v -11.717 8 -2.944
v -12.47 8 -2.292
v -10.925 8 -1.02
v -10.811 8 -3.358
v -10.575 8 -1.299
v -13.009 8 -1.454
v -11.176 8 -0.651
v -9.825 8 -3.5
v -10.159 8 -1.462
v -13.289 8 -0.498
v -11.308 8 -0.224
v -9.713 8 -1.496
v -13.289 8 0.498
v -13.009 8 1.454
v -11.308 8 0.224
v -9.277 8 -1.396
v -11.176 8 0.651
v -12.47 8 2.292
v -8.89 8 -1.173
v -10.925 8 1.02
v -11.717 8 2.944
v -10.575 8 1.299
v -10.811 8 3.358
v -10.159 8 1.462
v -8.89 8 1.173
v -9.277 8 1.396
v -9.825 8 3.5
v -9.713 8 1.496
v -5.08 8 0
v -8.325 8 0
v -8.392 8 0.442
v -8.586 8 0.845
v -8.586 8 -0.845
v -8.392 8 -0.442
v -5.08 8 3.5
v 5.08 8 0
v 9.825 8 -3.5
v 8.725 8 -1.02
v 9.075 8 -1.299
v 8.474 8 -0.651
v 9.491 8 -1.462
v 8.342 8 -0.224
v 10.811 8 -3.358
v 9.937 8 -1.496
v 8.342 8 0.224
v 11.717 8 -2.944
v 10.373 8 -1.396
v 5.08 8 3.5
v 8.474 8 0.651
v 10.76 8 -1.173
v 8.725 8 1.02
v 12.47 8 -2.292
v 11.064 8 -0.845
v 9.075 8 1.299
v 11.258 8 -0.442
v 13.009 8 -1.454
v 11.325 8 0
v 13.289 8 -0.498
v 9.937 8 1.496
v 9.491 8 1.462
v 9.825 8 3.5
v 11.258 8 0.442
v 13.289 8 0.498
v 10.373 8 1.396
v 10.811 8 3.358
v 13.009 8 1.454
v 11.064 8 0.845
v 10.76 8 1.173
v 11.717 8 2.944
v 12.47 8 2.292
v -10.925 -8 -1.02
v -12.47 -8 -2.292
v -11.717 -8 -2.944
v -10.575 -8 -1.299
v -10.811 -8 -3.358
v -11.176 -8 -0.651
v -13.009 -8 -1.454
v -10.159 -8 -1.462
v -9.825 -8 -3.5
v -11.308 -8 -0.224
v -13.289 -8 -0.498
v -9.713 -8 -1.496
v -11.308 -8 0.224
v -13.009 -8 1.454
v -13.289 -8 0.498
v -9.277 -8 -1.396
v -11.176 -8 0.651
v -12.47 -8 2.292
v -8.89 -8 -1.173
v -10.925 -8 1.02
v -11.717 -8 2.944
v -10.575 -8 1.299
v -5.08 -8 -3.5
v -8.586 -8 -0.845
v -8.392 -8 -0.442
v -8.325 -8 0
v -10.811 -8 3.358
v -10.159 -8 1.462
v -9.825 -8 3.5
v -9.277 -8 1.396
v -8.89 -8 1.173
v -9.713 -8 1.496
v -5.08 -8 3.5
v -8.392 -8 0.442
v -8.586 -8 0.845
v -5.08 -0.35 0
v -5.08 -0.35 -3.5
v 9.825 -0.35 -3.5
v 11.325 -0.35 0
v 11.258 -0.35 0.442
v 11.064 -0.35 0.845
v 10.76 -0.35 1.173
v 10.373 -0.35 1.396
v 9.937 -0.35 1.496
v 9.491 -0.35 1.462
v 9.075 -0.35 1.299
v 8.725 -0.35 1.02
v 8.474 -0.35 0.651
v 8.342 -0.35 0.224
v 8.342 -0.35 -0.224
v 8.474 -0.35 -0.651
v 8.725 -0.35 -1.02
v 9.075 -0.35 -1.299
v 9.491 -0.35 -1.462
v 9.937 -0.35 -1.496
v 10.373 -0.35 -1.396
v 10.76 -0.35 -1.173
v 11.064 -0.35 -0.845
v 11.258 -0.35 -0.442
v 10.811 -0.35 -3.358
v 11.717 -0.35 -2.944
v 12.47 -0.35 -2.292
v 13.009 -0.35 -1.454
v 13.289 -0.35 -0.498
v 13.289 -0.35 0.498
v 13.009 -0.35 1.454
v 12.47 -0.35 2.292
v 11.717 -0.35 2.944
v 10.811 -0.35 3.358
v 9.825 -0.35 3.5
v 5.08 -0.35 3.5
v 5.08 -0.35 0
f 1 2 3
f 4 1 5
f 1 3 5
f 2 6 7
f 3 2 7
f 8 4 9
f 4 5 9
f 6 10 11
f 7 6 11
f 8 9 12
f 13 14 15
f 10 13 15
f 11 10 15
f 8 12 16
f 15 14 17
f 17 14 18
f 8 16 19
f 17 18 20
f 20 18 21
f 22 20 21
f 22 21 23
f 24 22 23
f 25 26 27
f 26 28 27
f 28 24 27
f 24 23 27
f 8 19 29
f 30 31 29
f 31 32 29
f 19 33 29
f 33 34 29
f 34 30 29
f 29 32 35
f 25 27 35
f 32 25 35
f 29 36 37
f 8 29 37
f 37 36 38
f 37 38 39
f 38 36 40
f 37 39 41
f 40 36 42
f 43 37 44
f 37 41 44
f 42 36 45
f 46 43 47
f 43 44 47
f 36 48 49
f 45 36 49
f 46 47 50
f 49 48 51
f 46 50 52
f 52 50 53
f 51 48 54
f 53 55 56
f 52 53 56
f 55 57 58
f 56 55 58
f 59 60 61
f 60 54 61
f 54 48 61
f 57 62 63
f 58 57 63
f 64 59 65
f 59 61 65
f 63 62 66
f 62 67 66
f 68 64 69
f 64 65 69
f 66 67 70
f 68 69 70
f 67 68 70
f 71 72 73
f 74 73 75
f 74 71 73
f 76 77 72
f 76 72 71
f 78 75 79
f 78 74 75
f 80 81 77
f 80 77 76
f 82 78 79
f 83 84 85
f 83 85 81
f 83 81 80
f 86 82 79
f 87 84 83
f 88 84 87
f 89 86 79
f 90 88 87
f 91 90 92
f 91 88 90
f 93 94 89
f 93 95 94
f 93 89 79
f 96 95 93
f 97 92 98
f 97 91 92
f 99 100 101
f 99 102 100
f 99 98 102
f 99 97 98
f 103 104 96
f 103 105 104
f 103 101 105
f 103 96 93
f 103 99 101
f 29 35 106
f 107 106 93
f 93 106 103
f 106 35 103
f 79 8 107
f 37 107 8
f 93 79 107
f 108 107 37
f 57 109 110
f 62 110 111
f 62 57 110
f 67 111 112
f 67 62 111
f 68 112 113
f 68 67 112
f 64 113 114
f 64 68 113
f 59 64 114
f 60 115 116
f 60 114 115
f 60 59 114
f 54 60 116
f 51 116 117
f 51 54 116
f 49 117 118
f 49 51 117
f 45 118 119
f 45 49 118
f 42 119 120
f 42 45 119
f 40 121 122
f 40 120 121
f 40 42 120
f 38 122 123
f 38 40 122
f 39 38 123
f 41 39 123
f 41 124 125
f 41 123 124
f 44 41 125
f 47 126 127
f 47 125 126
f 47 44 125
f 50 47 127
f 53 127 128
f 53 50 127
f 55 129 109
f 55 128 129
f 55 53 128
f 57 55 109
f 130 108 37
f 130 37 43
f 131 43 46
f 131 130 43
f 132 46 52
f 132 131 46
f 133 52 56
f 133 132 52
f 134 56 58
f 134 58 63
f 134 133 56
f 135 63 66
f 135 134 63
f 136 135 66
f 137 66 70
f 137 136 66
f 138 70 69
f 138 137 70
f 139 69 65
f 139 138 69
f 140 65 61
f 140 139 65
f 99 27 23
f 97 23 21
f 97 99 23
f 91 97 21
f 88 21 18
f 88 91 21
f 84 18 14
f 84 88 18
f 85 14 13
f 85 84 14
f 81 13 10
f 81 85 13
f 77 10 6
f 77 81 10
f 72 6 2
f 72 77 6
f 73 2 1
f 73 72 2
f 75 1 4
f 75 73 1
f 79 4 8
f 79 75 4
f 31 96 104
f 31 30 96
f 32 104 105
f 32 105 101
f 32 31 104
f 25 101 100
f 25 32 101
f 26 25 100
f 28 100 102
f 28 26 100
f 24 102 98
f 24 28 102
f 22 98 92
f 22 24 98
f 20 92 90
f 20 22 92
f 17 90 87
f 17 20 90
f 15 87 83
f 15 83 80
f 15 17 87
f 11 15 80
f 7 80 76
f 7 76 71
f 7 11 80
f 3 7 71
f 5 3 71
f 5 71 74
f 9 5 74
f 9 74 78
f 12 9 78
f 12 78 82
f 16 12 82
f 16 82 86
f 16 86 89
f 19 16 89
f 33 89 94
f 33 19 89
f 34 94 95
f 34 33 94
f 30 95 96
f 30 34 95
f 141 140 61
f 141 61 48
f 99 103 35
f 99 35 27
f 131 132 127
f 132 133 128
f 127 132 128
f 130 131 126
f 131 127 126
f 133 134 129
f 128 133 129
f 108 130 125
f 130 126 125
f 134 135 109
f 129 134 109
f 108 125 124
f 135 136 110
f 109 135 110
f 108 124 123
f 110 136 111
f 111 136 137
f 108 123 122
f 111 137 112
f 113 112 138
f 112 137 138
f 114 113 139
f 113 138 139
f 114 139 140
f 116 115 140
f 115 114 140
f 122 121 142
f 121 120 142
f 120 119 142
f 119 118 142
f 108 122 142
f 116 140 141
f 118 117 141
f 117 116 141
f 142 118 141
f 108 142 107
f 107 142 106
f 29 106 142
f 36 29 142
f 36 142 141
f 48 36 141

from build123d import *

# Parameters (mm, degrees)
F0_R     = 1.5
F1_DEPTH = 8
F2_W     = 14.905
F2_H     = 7.65
F3_DEPTH = 7.001
F4_W     = 10.16
F4_H     = 12.091013
F5_DEPTH = 8.351


with BuildPart() as f1:
    # F0 (on Front) → F1 (new body, symmetric)
    with BuildSketch(Plane.XZ):
        with BuildLine():
            Line((9.825, 3.5), (-9.825, 3.5))
            ThreePointArc((-9.825, 3.5), (-13.325, 0), (-9.825, -3.5))
            Line((-9.825, -3.5), (9.825, -3.5))
            ThreePointArc((9.825, -3.5), (13.325, 0), (9.825, 3.5))
        make_face()
        with Locations((-9.825, 0)):
            Circle(F0_R, mode=Mode.SUBTRACT)
        with Locations((9.825, 0)):
            Circle(F0_R, mode=Mode.SUBTRACT)
    extrude(amount=F1_DEPTH, both=True)

    # F2 (on face) → F3 (cut, through all)
    with BuildSketch(Plane.XY.offset(3.5)):
        Polygon((27.112617, -0.35), (9.825, -0.35), (9.825, -8), (-5.08, -8), (-5.08, -17.684488), (27.112617, -17.684488), align=None)
        with Locations((2.3725, -4.175)):
            Rectangle(F2_W, F2_H)
    extrude(amount=-F3_DEPTH, mode=Mode.SUBTRACT)

    # F4 (on face) → F5 (cut, through all)
    with BuildSketch(Plane.XZ.offset(0.35)):
        with Locations((0, 6.045507)):
            Rectangle(F4_W, F4_H)
    extrude(amount=-F5_DEPTH, mode=Mode.SUBTRACT)


solid = f1.part
